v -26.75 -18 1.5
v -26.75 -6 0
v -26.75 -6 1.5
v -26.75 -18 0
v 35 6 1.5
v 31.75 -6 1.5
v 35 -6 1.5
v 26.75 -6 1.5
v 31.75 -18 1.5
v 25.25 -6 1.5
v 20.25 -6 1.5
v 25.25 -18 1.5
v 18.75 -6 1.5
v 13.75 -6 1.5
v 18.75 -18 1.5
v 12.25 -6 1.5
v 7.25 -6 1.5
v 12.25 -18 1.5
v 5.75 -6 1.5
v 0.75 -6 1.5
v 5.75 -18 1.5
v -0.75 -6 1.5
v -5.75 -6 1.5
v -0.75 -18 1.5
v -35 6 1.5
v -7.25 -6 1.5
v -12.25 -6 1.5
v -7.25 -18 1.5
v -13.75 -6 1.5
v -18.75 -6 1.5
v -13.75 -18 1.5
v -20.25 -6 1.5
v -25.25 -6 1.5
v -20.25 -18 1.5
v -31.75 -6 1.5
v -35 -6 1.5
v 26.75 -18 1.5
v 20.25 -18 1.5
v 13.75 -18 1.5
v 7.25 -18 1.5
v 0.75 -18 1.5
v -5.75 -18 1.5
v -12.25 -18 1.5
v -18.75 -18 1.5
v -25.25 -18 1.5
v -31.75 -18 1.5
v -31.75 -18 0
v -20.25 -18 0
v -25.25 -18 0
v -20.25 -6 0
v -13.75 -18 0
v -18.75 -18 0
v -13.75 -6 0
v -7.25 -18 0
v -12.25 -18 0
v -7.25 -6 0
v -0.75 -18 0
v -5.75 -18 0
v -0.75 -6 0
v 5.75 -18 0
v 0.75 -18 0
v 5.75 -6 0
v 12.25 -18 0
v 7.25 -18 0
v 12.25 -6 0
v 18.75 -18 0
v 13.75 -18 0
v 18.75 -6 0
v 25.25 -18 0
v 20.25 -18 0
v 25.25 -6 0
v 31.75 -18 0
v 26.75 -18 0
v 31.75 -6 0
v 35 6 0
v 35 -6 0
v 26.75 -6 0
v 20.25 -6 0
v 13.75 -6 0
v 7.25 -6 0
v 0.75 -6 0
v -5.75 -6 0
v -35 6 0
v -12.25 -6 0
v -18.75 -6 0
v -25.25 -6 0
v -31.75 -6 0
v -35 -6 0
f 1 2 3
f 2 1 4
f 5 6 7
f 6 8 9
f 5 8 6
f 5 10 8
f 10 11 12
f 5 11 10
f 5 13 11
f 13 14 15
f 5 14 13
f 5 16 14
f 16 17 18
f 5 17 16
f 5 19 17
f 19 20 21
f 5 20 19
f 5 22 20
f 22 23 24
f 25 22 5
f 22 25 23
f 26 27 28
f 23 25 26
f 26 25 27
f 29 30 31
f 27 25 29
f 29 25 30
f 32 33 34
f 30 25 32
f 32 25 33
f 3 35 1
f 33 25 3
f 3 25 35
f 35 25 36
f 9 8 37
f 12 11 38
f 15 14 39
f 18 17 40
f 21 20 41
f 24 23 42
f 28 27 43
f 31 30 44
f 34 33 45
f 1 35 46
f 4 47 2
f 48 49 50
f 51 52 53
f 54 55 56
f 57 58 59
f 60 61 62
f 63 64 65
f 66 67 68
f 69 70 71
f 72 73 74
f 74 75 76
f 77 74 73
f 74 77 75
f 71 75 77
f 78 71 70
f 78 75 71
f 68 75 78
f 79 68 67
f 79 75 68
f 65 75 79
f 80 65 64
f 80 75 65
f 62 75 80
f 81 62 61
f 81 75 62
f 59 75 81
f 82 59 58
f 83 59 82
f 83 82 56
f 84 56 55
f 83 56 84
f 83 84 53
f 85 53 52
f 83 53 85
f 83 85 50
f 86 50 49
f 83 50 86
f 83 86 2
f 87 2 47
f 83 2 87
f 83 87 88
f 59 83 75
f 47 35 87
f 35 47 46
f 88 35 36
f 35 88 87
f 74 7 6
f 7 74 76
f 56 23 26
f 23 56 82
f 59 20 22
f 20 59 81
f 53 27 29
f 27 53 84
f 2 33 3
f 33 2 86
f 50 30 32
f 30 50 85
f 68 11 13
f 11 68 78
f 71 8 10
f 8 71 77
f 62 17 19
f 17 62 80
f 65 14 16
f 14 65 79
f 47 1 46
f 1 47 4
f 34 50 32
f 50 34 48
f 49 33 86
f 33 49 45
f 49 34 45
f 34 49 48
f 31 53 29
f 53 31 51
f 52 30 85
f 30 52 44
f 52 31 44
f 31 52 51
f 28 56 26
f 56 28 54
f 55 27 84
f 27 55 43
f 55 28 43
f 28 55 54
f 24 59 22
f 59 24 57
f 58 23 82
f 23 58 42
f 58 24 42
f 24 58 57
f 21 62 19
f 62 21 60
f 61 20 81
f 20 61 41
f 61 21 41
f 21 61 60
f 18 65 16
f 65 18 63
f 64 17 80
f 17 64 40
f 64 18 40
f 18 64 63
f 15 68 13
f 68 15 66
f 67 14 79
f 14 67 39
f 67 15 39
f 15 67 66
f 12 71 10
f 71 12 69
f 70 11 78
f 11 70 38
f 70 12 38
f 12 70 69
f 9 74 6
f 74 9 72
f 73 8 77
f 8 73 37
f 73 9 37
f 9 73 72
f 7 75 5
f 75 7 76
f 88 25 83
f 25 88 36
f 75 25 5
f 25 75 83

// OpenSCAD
// 10-well Agarose Gel Comb
// Designed for FDM printing, lying flat on the build plate.

// --- Dimensions (measured with calipers) ---
plate_thickness = 1.5;   // Z thickness of the entire comb
spine_length = 70;       // X length of the spine
spine_width = 12;        // Y width of the spine
num_teeth = 10;          // Number of teeth/wells
tooth_width = 5.0;       // X width of each tooth
tooth_length = 12;       // Y length of each tooth (extends from spine)
gap_width = 1.5;         // Gap between neighbouring teeth

// --- Derived Calculations ---
// Total width occupied by teeth and gaps
// Formula: (num_teeth * tooth_width) + ((num_teeth - 1) * gap_width)
total_tooth_row_width = (num_teeth * tooth_width) + ((num_teeth - 1) * gap_width);

// Center the tooth row on the spine (X-axis)
// The spine is centered at X=0, so we offset the first tooth to start at -total_tooth_row_width/2
start_x = -total_tooth_row_width / 2;

// The teeth hang in the -Y direction from the spine.
// The spine is centered at Y=0, so it spans from -spine_width/2 to +spine_width/2.
// The teeth attach to the edge at Y = -spine_width/2.
// They extend further in -Y by tooth_length.
tooth_attach_y = -spine_width / 2;

// --- Quality Settings ---
$fn = 64; // High resolution for smooth edges

// --- Main Structure ---
union() {
    // 1. The Spine (Back Bar)
    // Centered at origin, lying flat on Z=0
    translate([-spine_length/2, -spine_width/2, 0])
        cube([spine_length, spine_width, plate_thickness]);

    // 2. The Teeth
    // Generated using a for loop
    for (i = [0 : num_teeth - 1]) {
        // Calculate X position for the current tooth
        current_x = start_x + i * (tooth_width + gap_width);
        
        // Position the tooth:
        // X: current_x
        // Y: Starts at tooth_attach_y and extends -tooth_length
        // Z: 0 to plate_thickness
        translate([current_x, tooth_attach_y - tooth_length, 0])
            cube([tooth_width, tooth_length, plate_thickness]);
    }
}
